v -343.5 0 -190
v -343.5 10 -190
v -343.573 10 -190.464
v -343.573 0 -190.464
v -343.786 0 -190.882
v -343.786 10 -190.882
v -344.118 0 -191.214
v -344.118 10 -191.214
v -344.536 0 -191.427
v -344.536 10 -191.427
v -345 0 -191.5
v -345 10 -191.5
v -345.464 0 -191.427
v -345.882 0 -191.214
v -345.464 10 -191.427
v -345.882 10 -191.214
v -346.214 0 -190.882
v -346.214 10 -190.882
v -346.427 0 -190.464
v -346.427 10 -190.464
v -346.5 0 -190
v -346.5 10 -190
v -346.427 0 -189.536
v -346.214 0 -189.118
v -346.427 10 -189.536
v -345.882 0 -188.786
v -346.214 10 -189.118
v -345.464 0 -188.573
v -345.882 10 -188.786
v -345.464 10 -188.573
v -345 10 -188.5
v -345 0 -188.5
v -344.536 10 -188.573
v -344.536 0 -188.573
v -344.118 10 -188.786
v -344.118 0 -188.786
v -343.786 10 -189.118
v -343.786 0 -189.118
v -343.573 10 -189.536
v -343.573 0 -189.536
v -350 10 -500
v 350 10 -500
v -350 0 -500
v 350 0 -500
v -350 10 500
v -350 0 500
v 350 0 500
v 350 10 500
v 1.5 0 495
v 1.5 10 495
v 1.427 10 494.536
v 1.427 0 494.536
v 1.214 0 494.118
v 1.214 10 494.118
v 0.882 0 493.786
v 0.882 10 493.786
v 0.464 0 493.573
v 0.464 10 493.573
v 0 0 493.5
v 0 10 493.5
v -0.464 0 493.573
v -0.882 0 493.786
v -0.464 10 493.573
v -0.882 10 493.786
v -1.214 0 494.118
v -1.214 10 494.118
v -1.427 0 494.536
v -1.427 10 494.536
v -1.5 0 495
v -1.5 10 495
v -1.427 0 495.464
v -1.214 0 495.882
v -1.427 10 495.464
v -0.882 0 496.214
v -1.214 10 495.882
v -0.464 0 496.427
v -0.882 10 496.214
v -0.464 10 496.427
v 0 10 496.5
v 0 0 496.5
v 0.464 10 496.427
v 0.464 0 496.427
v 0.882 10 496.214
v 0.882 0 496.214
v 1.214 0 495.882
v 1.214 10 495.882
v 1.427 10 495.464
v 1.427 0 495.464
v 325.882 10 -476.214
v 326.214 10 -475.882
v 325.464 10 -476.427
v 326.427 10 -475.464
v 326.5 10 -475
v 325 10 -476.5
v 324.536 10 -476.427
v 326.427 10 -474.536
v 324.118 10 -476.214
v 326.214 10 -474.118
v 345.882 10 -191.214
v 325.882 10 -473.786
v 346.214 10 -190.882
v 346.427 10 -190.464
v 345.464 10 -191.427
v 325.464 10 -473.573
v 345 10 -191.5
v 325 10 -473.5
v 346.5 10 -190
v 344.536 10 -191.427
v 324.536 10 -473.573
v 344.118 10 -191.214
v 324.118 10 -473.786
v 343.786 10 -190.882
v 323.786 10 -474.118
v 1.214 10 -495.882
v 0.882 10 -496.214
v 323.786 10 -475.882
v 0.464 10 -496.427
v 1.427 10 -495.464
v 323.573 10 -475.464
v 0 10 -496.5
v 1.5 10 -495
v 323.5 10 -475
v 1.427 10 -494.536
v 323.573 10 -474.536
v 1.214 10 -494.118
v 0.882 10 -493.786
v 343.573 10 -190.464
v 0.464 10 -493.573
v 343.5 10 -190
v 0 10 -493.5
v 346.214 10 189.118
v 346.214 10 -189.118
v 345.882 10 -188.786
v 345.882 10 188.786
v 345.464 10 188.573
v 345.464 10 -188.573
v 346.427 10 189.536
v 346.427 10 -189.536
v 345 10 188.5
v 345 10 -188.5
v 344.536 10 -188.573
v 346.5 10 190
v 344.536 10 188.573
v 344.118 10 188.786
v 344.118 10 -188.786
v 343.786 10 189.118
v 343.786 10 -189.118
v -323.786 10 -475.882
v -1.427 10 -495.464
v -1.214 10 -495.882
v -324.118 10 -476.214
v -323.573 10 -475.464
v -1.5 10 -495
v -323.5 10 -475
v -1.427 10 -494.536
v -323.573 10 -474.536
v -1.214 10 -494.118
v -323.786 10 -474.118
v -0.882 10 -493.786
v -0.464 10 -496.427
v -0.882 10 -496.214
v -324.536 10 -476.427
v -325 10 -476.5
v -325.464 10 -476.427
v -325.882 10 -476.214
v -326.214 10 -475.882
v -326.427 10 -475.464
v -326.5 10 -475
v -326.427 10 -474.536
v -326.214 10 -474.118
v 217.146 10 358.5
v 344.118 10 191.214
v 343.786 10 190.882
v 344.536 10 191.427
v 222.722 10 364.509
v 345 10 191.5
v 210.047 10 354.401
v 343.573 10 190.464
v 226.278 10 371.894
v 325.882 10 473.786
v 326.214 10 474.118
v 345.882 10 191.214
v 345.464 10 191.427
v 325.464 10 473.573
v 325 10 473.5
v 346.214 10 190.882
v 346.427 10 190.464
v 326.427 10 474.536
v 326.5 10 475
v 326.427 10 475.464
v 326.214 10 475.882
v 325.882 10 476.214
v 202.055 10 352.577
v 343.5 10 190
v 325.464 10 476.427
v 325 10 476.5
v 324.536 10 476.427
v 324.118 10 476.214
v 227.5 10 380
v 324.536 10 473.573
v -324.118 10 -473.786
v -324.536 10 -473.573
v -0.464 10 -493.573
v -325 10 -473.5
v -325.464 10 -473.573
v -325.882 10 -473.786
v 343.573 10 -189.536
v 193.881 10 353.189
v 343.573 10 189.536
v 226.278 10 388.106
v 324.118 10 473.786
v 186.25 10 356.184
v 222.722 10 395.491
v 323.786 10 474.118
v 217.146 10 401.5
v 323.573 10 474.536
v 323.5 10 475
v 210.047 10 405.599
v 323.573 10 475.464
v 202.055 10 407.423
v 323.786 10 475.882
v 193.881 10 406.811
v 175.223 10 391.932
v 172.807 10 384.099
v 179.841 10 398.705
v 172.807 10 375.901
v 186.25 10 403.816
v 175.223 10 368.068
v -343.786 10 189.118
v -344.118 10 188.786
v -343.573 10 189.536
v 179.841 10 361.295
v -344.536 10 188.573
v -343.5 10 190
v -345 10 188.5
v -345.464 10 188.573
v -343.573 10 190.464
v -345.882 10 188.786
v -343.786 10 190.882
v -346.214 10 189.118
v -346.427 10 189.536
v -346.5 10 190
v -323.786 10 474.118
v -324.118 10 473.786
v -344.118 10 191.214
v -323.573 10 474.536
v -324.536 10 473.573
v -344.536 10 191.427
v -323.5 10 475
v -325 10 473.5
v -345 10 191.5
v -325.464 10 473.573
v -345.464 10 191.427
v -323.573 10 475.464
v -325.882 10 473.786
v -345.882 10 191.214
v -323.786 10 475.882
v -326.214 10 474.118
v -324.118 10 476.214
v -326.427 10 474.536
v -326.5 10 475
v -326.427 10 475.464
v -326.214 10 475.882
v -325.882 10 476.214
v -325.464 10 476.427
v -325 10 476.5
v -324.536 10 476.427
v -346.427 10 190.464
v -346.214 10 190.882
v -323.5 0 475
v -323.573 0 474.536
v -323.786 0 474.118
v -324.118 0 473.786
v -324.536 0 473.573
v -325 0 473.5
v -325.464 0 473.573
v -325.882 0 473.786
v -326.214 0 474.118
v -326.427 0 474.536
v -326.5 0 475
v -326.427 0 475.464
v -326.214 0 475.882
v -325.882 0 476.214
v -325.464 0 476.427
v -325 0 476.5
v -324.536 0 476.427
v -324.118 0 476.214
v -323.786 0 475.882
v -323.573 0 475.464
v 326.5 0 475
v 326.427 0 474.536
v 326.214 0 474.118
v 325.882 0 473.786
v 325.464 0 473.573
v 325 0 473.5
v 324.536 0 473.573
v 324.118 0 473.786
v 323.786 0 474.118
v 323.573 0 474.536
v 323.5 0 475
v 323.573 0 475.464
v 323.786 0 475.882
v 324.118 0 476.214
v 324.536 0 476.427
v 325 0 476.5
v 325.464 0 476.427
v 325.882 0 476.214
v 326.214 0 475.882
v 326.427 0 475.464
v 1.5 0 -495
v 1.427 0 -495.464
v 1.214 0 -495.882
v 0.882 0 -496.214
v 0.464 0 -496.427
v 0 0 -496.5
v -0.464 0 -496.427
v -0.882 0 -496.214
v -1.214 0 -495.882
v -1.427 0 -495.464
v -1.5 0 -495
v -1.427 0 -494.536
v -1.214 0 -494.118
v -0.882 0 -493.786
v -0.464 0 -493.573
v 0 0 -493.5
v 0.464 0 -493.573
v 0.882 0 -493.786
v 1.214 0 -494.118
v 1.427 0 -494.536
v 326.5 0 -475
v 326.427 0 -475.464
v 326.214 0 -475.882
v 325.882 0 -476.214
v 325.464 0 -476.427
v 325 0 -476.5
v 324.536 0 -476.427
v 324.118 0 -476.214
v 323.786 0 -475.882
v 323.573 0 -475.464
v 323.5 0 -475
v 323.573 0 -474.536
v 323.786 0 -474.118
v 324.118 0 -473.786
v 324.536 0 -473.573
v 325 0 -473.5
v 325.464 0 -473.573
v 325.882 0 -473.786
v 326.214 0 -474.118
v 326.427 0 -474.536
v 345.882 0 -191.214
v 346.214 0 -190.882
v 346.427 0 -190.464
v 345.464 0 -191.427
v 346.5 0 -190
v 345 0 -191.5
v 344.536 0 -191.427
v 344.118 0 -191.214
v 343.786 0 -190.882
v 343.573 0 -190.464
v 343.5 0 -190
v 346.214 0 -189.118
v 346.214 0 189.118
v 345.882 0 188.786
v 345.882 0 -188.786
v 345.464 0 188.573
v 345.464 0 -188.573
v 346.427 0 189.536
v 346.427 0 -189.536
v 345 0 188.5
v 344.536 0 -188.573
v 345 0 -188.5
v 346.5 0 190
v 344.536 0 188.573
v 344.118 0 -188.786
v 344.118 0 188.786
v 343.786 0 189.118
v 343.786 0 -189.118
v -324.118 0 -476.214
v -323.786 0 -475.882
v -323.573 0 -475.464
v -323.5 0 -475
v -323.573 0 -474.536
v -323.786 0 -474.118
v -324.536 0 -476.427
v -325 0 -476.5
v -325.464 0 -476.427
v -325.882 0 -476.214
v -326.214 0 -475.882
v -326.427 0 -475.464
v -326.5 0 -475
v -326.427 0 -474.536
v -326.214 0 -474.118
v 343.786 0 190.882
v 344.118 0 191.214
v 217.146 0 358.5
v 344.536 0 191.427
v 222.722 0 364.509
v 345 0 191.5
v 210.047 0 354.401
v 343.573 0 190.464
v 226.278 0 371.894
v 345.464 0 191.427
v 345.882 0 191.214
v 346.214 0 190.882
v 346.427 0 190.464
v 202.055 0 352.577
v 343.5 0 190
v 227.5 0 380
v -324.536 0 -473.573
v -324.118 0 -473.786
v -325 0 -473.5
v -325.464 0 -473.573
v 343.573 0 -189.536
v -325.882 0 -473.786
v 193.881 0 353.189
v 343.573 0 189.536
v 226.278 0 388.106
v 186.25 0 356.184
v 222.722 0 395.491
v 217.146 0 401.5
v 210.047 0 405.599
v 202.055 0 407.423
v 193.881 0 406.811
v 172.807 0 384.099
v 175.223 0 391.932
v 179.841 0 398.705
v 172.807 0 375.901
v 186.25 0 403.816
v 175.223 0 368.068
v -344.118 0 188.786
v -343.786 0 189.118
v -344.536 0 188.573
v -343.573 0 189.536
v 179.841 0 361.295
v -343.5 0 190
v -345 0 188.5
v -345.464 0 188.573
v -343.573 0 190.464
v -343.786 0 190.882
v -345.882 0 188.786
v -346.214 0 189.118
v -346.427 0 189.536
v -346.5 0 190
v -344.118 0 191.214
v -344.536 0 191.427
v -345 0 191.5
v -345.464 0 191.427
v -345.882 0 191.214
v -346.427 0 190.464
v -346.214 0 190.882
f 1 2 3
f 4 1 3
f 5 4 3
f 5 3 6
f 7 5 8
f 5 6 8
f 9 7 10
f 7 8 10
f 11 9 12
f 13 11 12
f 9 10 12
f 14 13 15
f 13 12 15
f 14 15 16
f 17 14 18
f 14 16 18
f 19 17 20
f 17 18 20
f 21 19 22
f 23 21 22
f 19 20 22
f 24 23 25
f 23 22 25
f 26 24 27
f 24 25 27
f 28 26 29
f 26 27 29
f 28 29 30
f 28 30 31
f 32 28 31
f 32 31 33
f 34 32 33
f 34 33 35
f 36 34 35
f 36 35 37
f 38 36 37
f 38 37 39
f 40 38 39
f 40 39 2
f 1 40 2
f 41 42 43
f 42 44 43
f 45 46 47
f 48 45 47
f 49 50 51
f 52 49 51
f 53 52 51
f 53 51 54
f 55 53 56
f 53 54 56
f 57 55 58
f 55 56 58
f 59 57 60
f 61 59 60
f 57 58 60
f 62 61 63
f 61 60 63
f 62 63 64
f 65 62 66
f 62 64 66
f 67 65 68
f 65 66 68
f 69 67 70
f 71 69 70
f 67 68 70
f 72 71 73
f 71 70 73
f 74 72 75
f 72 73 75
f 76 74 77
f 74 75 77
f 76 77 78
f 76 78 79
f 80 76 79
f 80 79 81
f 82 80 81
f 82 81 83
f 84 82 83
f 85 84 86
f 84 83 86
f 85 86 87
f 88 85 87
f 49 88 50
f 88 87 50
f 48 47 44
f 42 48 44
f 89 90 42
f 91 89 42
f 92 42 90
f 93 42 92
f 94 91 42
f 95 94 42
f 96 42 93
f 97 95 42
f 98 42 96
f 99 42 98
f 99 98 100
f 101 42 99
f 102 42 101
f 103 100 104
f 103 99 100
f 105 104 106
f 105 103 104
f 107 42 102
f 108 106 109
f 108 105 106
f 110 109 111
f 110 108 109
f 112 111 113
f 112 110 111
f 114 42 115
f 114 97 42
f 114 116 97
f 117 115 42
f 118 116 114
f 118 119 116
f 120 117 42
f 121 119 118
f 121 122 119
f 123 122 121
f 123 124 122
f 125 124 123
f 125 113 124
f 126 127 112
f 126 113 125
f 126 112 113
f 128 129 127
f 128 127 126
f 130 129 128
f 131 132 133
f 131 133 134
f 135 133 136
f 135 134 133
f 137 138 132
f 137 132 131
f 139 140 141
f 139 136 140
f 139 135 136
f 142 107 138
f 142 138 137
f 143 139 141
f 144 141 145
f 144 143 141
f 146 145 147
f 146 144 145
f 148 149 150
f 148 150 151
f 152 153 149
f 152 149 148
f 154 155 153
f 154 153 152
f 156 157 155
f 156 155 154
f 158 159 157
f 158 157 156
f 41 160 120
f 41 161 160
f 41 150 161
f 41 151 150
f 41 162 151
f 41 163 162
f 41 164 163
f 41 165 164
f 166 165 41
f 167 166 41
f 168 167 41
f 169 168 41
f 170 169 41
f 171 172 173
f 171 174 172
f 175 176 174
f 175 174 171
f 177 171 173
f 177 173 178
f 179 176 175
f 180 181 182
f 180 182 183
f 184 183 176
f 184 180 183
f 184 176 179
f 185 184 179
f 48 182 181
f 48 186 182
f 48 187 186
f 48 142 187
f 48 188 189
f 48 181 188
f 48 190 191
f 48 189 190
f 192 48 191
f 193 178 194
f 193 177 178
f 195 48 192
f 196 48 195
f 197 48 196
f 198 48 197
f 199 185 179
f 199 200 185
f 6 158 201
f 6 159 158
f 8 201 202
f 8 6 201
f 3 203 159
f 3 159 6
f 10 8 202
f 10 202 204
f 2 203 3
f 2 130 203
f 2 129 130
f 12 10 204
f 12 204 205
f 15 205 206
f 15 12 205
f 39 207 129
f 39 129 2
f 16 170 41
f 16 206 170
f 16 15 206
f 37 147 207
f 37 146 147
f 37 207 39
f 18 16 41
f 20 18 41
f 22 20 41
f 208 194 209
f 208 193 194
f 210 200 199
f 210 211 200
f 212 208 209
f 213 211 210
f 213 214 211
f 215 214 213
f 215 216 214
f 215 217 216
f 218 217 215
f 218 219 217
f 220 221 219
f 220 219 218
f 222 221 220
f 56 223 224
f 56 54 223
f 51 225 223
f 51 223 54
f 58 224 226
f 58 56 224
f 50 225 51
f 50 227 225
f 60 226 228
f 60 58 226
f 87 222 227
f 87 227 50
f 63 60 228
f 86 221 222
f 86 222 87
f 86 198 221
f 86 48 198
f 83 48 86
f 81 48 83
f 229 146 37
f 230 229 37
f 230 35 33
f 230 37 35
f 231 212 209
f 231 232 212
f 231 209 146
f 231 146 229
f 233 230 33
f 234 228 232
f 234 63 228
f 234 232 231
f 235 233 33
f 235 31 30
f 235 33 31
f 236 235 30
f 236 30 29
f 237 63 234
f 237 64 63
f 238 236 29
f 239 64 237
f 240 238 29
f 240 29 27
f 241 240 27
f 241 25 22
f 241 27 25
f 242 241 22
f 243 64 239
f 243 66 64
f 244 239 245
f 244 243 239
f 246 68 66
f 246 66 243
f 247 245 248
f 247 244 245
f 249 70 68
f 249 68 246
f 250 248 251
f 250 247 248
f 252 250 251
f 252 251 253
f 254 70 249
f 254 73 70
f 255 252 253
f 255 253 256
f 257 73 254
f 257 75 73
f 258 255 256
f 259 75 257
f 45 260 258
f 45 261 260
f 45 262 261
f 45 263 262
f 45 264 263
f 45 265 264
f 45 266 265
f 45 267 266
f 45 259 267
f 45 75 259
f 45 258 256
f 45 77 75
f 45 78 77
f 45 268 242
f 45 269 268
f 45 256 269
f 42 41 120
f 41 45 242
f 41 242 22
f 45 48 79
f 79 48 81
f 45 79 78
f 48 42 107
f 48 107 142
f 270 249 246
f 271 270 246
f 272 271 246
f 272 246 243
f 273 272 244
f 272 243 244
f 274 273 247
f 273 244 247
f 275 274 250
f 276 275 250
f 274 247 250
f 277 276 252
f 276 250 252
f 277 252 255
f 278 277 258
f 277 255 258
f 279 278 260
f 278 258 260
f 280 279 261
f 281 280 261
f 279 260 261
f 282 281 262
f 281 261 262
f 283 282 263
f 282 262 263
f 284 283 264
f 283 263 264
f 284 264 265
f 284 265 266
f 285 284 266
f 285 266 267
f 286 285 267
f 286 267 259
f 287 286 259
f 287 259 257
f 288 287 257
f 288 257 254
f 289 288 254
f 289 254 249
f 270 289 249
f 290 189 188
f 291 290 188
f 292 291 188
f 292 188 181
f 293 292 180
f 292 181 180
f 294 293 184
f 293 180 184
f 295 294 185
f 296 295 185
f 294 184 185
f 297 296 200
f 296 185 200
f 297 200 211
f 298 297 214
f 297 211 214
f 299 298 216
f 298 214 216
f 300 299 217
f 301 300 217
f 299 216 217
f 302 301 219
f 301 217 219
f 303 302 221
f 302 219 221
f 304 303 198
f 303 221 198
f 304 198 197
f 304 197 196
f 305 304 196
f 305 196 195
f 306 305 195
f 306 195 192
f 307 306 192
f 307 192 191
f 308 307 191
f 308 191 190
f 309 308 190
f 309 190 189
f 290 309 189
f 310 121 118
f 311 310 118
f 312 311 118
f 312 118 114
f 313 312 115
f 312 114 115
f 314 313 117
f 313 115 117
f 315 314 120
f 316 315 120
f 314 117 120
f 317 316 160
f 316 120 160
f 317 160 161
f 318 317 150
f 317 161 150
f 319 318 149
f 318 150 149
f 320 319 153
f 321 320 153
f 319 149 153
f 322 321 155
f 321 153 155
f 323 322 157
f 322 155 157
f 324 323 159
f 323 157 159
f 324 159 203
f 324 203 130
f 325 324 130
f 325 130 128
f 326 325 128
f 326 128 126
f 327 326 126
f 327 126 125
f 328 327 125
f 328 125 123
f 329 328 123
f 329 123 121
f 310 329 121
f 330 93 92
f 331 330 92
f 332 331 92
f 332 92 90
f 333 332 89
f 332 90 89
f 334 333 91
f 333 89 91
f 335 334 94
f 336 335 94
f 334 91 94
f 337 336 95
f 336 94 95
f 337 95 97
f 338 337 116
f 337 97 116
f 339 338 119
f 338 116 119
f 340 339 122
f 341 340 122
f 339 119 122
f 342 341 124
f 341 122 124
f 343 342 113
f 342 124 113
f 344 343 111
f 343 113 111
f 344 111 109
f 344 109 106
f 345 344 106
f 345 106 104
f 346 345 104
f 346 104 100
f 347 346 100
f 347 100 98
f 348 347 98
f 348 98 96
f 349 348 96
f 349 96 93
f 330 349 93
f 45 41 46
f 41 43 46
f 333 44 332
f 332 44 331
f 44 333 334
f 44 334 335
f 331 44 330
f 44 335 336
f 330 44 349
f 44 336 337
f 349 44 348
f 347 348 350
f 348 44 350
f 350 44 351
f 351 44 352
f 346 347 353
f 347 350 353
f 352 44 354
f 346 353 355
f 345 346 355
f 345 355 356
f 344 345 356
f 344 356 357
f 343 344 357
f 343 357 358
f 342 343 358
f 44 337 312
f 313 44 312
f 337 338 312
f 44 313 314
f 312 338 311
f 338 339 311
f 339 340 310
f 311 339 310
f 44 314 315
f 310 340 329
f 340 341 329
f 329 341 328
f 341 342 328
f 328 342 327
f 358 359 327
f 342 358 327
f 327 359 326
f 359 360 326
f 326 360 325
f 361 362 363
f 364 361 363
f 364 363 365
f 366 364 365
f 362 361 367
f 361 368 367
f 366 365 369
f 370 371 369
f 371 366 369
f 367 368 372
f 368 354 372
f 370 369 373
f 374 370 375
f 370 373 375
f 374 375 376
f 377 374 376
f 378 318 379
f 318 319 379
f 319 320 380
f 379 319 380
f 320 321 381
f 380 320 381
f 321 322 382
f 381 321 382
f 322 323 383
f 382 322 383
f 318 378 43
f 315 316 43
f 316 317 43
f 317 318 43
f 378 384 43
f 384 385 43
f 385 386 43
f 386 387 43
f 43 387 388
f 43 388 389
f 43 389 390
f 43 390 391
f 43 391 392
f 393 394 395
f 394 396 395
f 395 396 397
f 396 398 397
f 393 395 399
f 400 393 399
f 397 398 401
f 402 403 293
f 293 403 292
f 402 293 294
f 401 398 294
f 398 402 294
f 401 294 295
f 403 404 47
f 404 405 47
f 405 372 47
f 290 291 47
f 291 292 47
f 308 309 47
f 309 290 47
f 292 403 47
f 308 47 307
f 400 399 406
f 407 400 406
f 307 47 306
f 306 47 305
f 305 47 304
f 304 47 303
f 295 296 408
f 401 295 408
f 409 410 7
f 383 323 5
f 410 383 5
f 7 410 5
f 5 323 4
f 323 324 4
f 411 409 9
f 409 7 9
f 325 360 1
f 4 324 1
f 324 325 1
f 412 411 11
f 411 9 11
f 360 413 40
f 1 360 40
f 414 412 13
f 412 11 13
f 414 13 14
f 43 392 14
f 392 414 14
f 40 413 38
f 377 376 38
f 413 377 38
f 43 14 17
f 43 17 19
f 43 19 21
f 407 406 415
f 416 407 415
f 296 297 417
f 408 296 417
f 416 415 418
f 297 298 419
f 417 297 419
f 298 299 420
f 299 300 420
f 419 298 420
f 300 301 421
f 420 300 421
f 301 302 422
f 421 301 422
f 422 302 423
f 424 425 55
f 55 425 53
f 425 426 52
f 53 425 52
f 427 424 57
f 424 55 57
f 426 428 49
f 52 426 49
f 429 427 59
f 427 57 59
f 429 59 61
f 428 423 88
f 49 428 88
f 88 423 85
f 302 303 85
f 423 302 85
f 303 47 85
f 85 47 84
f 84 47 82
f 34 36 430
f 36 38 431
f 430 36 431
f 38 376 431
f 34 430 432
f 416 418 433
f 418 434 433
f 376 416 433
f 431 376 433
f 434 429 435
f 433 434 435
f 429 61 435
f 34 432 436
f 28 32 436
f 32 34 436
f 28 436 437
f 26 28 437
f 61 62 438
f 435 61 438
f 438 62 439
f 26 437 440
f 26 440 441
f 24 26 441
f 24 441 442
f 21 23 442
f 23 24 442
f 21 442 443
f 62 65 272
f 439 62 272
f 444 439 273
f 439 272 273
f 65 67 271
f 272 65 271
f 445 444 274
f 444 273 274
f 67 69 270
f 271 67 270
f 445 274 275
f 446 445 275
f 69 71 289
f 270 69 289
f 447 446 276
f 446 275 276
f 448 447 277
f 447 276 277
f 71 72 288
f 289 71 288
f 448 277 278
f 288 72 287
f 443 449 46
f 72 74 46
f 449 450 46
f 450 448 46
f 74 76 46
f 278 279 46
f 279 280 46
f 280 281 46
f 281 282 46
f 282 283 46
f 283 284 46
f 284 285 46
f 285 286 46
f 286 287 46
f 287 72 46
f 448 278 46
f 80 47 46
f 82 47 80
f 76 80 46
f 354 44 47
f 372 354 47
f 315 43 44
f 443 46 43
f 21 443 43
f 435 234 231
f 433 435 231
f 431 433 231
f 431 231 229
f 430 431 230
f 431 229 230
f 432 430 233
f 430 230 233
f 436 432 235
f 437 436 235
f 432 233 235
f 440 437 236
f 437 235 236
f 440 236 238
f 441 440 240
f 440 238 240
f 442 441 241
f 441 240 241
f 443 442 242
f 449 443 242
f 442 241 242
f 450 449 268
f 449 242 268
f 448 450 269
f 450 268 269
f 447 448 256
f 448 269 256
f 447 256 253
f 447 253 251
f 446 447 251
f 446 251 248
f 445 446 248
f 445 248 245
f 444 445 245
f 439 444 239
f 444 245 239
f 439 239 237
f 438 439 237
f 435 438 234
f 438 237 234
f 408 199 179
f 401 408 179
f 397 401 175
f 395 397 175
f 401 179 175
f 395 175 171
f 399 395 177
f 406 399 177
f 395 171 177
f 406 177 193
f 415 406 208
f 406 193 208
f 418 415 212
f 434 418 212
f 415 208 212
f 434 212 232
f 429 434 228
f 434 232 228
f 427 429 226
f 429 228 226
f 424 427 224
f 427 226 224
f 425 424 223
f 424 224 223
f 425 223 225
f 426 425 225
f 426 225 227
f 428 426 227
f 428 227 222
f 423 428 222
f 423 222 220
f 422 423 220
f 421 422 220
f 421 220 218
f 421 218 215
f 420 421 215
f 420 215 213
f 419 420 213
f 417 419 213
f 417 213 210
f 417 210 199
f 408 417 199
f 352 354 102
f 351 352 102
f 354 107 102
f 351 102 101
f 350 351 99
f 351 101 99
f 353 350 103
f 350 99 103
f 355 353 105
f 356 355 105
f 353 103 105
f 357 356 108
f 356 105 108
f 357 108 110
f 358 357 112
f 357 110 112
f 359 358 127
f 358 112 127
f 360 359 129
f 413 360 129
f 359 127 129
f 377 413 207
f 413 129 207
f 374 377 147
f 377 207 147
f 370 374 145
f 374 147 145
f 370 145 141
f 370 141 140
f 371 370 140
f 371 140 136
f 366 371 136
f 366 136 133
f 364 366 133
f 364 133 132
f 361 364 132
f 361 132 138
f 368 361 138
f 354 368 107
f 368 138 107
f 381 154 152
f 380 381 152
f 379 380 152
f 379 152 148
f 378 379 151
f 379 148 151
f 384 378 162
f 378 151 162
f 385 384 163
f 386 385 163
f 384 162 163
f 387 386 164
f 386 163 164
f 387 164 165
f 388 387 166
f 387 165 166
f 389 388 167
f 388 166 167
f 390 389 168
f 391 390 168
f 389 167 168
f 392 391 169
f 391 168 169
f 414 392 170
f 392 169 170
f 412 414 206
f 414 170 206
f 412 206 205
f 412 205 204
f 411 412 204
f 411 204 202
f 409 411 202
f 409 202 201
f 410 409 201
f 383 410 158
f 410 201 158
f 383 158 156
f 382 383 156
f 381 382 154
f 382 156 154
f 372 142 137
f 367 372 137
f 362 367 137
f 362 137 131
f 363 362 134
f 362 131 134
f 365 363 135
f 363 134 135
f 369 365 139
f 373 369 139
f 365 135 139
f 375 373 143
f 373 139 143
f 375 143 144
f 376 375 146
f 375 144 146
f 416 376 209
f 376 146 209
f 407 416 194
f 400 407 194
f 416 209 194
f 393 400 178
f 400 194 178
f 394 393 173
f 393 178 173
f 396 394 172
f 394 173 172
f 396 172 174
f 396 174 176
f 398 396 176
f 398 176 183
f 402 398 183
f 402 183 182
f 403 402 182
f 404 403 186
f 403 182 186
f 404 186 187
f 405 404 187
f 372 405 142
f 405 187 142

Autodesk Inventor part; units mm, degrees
ref_plane "YZ Plane" through (0, 0, 0) normal (1, 0, 0) x (0, 1, 0)
ref_plane "XZ Plane" through (0, 0, 0) normal (0, 1, 0) x (-1, 0, 0)
ref_plane "XY Plane" through (0, 0, 0) normal (0, 0, 1) x (1, 0, 0)
sketch "Esquisse1" plane through (0, 0, 0) normal (0, 1, 0) x (-1, 0, 0)
  line L0 (350, 500) -> (-350, 500)
  line L1 (-350, 500) -> (-350, -500)
  line L2 (-350, -500) -> (350, -500)
  line L3 (350, -500) -> (350, 500)
  point P0 (0, 0)
  dimension "d0" = 1000
  dimension "d1" = 700
  dimension "d2" = 350
  dimension "d3" = 500
extrude "Extrusion1" add sketch "Esquisse1" along normal blind 10
sketch "Esquisse2" plane through (0, 10, 0) normal (0, 1, 0) x (1, 0, 0)
  point P0 (0, 0)
sketch "Esquisse3" plane through (0, 10, 0) normal (0, 1, 0) x (1, 0, 0)
  point P0 (0, 0)
sketch "Esquisse4" plane through (0, 10, 0) normal (0, 1, 0) x (1, 0, 0)
  circle A0 centre (200, -380) radius 27.5
  line L0 (-350, -500) -> (350, -500) projected
  line L1 (350, -500) -> (350, 500) projected
  point P0 (0, 0)
  dimension "d6" = 55
  dimension "d7" = 120
  dimension "d8" = 150
extrude "Extrusion2" cut sketch "Esquisse4" against normal through all
sketch "Esquisse5" plane through (0, 10, 0) normal (0, 1, 0) x (1, 0, 0)
  circle A0 centre (-325, -475) radius 1.5
  circle A1 centre (325, -475) radius 1.5
  circle A2 centre (325, 475) radius 1.5
  circle A3 centre (-325, 475) radius 1.5
  line L0 (350, 500) -> (-350, 500) projected
  line L1 (350, -500) -> (350, 500) projected
  line L2 (-350, 500) -> (-350, -500) projected
  line L3 (-350, -500) -> (350, -500) projected
  circle A4 centre (-345, -190) radius 1.5
  circle A5 centre (-345, 190) radius 1.5
  circle A6 centre (0, -495) radius 1.5
  circle A7 centre (0, 495) radius 1.5
  circle A8 centre (345, -190) radius 1.5
  circle A9 centre (345, 190) radius 1.5
  point P0 (0, 0)
  dimension "d11" = 3
  dimension "d12" = 3
  dimension "d13" = 3
  dimension "d14" = 3
  dimension "d15" = 25
  dimension "d16" = 25
  dimension "d17" = 25
  dimension "d18" = 25
  dimension "d19" = 25
  dimension "d20" = 25
  dimension "d21" = 25
  dimension "d22" = 25
  dimension "d23" = 3
  dimension "d24" = 3
  dimension "d25" = 3
  dimension "d26" = 3
  dimension "d27" = 3
  dimension "d28" = 3
  dimension "d29" = 5
  dimension "d30" = 5
  dimension "d31" = 5
  dimension "d32" = 5
  dimension "d33" = 5
  dimension "d34" = 5
  dimension "d35" = 350
  dimension "d36" = 350
  dimension "d37" = 190
  dimension "d38" = 190
  dimension "d39" = 190
  dimension "d40" = 190
extrude "Extrusion3" cut sketch "Esquisse5" against normal through all contours A0 | A1 | A2 | A3 | A4 | A5 | A6 | A7 | A8 | A9
equation "\"d0\" = Longueur_Plateau"
equation "\"d1\" = Largeur_Plateau"
equation "\"d2\" = 0.5 * d1"
equation "\"d3\" = 0.5 * d0"
equation "\"d12\" = d11"
equation "\"d13\" = d11"
equation "\"d14\" = d11"
equation "\"d16\" = d15"
equation "\"d17\" = d15"
equation "\"d18\" = d15"
equation "\"d19\" = d15"
equation "\"d20\" = d15"
equation "\"d21\" = d15"
equation "\"d22\" = d15"
equation "\"d24\" = d23"
equation "\"d25\" = d23"
equation "\"d26\" = d23"
equation "\"d27\" = d23"
equation "\"d28\" = d23"
equation "\"d30\" = d29"
equation "\"d31\" = d29"
equation "\"d32\" = d29"
equation "\"d33\" = d29"
equation "\"d34\" = d29"
equation "\"d38\" = d37"
equation "\"d39\" = d37"
equation "\"d40\" = d37"
equation "\"Longueur_Plateau\" = 1000"
equation "\"Largeur_Plateau\" = 700"
properties part number "Plateau" material "Bois (bouleau)"
